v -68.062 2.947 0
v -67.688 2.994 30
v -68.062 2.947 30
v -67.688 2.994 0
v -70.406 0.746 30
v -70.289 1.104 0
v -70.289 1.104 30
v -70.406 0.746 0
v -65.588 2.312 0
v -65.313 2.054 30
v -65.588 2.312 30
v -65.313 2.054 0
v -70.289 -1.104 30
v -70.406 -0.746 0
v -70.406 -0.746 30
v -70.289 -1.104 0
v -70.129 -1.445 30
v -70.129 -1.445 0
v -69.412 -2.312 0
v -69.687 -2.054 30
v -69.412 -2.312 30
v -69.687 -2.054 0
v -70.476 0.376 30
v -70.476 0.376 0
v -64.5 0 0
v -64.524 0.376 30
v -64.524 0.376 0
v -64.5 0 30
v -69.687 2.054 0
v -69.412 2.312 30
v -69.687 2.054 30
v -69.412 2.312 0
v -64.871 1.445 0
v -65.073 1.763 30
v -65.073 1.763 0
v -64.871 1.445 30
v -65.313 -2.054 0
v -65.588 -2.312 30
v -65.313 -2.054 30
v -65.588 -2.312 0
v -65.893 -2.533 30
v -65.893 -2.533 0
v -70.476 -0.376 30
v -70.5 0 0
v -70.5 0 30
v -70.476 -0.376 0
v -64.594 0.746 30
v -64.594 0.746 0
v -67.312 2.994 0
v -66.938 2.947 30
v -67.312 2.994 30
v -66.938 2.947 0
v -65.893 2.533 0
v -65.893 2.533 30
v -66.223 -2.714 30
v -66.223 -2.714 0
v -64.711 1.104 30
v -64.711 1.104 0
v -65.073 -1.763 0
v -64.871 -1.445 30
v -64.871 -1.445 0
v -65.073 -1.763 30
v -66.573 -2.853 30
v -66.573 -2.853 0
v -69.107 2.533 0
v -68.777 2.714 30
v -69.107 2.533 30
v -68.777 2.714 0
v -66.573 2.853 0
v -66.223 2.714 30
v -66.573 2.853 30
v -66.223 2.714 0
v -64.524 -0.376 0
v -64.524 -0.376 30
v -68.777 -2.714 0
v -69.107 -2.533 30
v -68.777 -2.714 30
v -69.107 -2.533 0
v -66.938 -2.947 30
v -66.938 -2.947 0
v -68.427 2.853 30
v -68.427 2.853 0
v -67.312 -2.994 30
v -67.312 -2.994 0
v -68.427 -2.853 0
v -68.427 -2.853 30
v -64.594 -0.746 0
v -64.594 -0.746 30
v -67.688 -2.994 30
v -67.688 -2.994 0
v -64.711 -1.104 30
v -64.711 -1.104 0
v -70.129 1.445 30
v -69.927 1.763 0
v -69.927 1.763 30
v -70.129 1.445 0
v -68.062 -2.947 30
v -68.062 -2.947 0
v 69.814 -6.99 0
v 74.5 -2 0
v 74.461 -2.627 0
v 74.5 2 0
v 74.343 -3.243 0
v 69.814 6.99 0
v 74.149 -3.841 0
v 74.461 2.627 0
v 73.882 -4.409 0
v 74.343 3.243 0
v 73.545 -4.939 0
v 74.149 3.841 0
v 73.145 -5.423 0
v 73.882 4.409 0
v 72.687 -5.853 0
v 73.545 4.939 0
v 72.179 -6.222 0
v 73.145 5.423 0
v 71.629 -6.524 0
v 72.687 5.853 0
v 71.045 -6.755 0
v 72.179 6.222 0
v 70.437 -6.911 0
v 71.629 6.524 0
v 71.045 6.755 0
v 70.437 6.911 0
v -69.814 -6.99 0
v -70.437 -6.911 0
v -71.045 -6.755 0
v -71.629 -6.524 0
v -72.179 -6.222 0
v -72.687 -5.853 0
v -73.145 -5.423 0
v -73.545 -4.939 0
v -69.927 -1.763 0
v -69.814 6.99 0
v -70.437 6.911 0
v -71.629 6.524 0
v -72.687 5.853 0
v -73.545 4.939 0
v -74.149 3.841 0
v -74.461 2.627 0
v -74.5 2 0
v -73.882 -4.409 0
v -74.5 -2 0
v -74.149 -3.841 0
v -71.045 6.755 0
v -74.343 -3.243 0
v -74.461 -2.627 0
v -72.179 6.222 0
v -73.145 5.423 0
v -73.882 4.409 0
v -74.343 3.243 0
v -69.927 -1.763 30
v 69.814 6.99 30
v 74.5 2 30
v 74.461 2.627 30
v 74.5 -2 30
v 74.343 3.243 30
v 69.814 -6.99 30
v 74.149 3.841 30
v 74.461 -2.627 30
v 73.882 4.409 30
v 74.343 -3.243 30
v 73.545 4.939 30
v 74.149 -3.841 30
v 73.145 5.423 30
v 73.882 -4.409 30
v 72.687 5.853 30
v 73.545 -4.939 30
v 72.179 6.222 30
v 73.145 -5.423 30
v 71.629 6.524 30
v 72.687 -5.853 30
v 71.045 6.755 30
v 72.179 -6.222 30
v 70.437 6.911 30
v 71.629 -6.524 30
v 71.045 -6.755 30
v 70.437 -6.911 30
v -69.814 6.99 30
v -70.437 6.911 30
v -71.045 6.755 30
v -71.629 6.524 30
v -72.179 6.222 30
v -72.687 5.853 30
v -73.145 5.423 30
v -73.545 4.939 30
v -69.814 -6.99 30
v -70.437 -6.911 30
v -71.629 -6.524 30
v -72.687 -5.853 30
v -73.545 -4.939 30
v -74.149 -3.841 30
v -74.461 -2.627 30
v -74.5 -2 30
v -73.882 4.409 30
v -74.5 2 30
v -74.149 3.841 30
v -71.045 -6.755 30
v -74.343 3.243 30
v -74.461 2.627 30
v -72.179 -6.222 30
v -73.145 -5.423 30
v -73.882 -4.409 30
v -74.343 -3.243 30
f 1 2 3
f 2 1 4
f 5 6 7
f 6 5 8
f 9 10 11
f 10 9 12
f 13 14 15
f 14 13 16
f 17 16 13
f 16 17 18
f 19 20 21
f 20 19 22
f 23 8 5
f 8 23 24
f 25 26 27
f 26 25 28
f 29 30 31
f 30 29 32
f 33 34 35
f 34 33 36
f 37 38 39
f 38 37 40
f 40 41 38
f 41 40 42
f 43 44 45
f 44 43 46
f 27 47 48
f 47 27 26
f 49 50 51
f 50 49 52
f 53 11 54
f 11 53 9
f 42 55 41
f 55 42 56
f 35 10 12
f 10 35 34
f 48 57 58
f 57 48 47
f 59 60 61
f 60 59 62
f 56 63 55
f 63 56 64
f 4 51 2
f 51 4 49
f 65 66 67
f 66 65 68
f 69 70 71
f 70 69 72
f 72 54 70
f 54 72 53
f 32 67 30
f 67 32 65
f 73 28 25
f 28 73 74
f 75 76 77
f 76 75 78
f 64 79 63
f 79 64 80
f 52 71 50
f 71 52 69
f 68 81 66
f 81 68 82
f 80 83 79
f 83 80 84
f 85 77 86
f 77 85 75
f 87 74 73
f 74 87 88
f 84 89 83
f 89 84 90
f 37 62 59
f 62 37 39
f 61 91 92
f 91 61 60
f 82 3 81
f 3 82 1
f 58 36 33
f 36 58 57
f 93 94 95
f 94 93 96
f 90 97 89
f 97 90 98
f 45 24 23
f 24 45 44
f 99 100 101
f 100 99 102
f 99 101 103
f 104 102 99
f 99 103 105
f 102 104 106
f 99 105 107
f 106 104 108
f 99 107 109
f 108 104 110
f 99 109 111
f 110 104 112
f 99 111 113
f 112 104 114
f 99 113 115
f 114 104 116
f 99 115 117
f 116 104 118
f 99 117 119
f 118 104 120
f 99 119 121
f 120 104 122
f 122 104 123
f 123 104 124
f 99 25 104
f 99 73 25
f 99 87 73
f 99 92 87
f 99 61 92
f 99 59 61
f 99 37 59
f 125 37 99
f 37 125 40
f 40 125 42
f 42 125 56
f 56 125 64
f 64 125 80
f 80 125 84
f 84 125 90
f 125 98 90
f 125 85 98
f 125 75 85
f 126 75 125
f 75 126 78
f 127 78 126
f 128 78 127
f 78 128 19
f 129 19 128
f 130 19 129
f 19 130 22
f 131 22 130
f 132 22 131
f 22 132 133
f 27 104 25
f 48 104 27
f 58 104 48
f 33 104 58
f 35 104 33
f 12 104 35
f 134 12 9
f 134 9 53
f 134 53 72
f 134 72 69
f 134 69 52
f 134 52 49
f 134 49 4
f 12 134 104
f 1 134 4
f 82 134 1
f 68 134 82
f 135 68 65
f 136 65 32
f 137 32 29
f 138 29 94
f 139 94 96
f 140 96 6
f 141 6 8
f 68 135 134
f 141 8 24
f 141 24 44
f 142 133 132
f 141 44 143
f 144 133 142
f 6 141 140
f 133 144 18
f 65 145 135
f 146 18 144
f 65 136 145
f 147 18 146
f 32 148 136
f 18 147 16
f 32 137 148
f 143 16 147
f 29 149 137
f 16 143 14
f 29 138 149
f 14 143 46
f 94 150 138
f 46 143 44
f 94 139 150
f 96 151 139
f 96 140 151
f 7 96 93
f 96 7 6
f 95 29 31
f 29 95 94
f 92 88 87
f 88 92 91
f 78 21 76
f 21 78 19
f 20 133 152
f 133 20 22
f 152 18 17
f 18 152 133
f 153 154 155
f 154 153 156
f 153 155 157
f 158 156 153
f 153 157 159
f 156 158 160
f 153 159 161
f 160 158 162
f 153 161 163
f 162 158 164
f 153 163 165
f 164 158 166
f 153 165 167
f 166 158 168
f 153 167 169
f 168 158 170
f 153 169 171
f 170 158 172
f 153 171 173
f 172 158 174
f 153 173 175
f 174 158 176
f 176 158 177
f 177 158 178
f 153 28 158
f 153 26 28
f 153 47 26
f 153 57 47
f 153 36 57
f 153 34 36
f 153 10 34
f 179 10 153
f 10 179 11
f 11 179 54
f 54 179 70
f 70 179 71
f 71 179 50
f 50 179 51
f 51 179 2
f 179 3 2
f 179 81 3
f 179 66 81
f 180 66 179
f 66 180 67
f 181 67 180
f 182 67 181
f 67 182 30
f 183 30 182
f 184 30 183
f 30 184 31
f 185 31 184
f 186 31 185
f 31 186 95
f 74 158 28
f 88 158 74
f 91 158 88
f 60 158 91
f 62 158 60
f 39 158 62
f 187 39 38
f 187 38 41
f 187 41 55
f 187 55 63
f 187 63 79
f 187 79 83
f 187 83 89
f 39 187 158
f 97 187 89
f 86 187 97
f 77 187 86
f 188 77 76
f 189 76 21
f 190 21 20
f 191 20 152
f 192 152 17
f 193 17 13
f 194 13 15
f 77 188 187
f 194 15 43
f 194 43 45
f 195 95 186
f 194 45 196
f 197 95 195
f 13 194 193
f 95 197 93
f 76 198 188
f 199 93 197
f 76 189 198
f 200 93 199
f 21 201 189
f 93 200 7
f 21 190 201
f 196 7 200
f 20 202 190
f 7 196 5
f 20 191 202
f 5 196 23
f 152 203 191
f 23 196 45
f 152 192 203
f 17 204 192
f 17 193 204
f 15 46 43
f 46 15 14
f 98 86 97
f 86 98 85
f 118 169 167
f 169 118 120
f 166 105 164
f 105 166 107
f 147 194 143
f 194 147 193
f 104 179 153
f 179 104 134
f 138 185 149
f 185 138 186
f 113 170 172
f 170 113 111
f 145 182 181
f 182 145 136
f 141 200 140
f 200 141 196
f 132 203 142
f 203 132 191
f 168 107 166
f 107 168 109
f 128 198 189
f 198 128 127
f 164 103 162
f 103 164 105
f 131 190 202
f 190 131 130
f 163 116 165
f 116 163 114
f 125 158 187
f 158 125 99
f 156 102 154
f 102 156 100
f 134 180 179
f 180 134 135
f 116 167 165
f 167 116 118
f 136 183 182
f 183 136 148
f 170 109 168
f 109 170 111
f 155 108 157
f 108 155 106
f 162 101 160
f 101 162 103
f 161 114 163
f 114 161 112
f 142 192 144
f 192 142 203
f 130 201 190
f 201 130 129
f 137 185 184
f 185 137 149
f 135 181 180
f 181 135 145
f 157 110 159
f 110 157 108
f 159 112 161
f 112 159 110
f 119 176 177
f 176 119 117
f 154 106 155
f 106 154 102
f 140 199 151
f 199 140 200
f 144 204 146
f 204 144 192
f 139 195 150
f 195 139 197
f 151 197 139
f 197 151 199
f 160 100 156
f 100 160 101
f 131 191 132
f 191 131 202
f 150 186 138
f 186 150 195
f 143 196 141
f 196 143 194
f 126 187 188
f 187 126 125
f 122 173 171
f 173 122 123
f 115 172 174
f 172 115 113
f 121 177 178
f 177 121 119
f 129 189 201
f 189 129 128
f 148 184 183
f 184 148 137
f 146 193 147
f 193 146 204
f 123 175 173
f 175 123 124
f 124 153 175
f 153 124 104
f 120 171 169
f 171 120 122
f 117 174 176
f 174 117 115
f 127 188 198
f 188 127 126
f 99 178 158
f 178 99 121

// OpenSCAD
$fn = 50;


difference() {
	union() {
		hull() {
			translate(v = [-69.5000000000, 2.0000000000, 0]) {
				cylinder(h = 30, r = 5);
			}
			translate(v = [69.5000000000, 2.0000000000, 0]) {
				cylinder(h = 30, r = 5);
			}
			translate(v = [-69.5000000000, -2.0000000000, 0]) {
				cylinder(h = 30, r = 5);
			}
			translate(v = [69.5000000000, -2.0000000000, 0]) {
				cylinder(h = 30, r = 5);
			}
		}
	}
	union() {
		translate(v = [-67.5000000000, 0.0000000000, 0]) {
			cylinder(h = 30, r = 3.0000000000);
		}
		translate(v = [-67.5000000000, 0.0000000000, 0]) {
			cylinder(h = 30, r = 1.5000000000);
		}
		translate(v = [-67.5000000000, 0.0000000000, 0]) {
			cylinder(h = 30, r = 1.5000000000);
		}
		translate(v = [-67.5000000000, 0.0000000000, 0]) {
			cylinder(h = 30, r = 1.5000000000);
		}
	}
}
